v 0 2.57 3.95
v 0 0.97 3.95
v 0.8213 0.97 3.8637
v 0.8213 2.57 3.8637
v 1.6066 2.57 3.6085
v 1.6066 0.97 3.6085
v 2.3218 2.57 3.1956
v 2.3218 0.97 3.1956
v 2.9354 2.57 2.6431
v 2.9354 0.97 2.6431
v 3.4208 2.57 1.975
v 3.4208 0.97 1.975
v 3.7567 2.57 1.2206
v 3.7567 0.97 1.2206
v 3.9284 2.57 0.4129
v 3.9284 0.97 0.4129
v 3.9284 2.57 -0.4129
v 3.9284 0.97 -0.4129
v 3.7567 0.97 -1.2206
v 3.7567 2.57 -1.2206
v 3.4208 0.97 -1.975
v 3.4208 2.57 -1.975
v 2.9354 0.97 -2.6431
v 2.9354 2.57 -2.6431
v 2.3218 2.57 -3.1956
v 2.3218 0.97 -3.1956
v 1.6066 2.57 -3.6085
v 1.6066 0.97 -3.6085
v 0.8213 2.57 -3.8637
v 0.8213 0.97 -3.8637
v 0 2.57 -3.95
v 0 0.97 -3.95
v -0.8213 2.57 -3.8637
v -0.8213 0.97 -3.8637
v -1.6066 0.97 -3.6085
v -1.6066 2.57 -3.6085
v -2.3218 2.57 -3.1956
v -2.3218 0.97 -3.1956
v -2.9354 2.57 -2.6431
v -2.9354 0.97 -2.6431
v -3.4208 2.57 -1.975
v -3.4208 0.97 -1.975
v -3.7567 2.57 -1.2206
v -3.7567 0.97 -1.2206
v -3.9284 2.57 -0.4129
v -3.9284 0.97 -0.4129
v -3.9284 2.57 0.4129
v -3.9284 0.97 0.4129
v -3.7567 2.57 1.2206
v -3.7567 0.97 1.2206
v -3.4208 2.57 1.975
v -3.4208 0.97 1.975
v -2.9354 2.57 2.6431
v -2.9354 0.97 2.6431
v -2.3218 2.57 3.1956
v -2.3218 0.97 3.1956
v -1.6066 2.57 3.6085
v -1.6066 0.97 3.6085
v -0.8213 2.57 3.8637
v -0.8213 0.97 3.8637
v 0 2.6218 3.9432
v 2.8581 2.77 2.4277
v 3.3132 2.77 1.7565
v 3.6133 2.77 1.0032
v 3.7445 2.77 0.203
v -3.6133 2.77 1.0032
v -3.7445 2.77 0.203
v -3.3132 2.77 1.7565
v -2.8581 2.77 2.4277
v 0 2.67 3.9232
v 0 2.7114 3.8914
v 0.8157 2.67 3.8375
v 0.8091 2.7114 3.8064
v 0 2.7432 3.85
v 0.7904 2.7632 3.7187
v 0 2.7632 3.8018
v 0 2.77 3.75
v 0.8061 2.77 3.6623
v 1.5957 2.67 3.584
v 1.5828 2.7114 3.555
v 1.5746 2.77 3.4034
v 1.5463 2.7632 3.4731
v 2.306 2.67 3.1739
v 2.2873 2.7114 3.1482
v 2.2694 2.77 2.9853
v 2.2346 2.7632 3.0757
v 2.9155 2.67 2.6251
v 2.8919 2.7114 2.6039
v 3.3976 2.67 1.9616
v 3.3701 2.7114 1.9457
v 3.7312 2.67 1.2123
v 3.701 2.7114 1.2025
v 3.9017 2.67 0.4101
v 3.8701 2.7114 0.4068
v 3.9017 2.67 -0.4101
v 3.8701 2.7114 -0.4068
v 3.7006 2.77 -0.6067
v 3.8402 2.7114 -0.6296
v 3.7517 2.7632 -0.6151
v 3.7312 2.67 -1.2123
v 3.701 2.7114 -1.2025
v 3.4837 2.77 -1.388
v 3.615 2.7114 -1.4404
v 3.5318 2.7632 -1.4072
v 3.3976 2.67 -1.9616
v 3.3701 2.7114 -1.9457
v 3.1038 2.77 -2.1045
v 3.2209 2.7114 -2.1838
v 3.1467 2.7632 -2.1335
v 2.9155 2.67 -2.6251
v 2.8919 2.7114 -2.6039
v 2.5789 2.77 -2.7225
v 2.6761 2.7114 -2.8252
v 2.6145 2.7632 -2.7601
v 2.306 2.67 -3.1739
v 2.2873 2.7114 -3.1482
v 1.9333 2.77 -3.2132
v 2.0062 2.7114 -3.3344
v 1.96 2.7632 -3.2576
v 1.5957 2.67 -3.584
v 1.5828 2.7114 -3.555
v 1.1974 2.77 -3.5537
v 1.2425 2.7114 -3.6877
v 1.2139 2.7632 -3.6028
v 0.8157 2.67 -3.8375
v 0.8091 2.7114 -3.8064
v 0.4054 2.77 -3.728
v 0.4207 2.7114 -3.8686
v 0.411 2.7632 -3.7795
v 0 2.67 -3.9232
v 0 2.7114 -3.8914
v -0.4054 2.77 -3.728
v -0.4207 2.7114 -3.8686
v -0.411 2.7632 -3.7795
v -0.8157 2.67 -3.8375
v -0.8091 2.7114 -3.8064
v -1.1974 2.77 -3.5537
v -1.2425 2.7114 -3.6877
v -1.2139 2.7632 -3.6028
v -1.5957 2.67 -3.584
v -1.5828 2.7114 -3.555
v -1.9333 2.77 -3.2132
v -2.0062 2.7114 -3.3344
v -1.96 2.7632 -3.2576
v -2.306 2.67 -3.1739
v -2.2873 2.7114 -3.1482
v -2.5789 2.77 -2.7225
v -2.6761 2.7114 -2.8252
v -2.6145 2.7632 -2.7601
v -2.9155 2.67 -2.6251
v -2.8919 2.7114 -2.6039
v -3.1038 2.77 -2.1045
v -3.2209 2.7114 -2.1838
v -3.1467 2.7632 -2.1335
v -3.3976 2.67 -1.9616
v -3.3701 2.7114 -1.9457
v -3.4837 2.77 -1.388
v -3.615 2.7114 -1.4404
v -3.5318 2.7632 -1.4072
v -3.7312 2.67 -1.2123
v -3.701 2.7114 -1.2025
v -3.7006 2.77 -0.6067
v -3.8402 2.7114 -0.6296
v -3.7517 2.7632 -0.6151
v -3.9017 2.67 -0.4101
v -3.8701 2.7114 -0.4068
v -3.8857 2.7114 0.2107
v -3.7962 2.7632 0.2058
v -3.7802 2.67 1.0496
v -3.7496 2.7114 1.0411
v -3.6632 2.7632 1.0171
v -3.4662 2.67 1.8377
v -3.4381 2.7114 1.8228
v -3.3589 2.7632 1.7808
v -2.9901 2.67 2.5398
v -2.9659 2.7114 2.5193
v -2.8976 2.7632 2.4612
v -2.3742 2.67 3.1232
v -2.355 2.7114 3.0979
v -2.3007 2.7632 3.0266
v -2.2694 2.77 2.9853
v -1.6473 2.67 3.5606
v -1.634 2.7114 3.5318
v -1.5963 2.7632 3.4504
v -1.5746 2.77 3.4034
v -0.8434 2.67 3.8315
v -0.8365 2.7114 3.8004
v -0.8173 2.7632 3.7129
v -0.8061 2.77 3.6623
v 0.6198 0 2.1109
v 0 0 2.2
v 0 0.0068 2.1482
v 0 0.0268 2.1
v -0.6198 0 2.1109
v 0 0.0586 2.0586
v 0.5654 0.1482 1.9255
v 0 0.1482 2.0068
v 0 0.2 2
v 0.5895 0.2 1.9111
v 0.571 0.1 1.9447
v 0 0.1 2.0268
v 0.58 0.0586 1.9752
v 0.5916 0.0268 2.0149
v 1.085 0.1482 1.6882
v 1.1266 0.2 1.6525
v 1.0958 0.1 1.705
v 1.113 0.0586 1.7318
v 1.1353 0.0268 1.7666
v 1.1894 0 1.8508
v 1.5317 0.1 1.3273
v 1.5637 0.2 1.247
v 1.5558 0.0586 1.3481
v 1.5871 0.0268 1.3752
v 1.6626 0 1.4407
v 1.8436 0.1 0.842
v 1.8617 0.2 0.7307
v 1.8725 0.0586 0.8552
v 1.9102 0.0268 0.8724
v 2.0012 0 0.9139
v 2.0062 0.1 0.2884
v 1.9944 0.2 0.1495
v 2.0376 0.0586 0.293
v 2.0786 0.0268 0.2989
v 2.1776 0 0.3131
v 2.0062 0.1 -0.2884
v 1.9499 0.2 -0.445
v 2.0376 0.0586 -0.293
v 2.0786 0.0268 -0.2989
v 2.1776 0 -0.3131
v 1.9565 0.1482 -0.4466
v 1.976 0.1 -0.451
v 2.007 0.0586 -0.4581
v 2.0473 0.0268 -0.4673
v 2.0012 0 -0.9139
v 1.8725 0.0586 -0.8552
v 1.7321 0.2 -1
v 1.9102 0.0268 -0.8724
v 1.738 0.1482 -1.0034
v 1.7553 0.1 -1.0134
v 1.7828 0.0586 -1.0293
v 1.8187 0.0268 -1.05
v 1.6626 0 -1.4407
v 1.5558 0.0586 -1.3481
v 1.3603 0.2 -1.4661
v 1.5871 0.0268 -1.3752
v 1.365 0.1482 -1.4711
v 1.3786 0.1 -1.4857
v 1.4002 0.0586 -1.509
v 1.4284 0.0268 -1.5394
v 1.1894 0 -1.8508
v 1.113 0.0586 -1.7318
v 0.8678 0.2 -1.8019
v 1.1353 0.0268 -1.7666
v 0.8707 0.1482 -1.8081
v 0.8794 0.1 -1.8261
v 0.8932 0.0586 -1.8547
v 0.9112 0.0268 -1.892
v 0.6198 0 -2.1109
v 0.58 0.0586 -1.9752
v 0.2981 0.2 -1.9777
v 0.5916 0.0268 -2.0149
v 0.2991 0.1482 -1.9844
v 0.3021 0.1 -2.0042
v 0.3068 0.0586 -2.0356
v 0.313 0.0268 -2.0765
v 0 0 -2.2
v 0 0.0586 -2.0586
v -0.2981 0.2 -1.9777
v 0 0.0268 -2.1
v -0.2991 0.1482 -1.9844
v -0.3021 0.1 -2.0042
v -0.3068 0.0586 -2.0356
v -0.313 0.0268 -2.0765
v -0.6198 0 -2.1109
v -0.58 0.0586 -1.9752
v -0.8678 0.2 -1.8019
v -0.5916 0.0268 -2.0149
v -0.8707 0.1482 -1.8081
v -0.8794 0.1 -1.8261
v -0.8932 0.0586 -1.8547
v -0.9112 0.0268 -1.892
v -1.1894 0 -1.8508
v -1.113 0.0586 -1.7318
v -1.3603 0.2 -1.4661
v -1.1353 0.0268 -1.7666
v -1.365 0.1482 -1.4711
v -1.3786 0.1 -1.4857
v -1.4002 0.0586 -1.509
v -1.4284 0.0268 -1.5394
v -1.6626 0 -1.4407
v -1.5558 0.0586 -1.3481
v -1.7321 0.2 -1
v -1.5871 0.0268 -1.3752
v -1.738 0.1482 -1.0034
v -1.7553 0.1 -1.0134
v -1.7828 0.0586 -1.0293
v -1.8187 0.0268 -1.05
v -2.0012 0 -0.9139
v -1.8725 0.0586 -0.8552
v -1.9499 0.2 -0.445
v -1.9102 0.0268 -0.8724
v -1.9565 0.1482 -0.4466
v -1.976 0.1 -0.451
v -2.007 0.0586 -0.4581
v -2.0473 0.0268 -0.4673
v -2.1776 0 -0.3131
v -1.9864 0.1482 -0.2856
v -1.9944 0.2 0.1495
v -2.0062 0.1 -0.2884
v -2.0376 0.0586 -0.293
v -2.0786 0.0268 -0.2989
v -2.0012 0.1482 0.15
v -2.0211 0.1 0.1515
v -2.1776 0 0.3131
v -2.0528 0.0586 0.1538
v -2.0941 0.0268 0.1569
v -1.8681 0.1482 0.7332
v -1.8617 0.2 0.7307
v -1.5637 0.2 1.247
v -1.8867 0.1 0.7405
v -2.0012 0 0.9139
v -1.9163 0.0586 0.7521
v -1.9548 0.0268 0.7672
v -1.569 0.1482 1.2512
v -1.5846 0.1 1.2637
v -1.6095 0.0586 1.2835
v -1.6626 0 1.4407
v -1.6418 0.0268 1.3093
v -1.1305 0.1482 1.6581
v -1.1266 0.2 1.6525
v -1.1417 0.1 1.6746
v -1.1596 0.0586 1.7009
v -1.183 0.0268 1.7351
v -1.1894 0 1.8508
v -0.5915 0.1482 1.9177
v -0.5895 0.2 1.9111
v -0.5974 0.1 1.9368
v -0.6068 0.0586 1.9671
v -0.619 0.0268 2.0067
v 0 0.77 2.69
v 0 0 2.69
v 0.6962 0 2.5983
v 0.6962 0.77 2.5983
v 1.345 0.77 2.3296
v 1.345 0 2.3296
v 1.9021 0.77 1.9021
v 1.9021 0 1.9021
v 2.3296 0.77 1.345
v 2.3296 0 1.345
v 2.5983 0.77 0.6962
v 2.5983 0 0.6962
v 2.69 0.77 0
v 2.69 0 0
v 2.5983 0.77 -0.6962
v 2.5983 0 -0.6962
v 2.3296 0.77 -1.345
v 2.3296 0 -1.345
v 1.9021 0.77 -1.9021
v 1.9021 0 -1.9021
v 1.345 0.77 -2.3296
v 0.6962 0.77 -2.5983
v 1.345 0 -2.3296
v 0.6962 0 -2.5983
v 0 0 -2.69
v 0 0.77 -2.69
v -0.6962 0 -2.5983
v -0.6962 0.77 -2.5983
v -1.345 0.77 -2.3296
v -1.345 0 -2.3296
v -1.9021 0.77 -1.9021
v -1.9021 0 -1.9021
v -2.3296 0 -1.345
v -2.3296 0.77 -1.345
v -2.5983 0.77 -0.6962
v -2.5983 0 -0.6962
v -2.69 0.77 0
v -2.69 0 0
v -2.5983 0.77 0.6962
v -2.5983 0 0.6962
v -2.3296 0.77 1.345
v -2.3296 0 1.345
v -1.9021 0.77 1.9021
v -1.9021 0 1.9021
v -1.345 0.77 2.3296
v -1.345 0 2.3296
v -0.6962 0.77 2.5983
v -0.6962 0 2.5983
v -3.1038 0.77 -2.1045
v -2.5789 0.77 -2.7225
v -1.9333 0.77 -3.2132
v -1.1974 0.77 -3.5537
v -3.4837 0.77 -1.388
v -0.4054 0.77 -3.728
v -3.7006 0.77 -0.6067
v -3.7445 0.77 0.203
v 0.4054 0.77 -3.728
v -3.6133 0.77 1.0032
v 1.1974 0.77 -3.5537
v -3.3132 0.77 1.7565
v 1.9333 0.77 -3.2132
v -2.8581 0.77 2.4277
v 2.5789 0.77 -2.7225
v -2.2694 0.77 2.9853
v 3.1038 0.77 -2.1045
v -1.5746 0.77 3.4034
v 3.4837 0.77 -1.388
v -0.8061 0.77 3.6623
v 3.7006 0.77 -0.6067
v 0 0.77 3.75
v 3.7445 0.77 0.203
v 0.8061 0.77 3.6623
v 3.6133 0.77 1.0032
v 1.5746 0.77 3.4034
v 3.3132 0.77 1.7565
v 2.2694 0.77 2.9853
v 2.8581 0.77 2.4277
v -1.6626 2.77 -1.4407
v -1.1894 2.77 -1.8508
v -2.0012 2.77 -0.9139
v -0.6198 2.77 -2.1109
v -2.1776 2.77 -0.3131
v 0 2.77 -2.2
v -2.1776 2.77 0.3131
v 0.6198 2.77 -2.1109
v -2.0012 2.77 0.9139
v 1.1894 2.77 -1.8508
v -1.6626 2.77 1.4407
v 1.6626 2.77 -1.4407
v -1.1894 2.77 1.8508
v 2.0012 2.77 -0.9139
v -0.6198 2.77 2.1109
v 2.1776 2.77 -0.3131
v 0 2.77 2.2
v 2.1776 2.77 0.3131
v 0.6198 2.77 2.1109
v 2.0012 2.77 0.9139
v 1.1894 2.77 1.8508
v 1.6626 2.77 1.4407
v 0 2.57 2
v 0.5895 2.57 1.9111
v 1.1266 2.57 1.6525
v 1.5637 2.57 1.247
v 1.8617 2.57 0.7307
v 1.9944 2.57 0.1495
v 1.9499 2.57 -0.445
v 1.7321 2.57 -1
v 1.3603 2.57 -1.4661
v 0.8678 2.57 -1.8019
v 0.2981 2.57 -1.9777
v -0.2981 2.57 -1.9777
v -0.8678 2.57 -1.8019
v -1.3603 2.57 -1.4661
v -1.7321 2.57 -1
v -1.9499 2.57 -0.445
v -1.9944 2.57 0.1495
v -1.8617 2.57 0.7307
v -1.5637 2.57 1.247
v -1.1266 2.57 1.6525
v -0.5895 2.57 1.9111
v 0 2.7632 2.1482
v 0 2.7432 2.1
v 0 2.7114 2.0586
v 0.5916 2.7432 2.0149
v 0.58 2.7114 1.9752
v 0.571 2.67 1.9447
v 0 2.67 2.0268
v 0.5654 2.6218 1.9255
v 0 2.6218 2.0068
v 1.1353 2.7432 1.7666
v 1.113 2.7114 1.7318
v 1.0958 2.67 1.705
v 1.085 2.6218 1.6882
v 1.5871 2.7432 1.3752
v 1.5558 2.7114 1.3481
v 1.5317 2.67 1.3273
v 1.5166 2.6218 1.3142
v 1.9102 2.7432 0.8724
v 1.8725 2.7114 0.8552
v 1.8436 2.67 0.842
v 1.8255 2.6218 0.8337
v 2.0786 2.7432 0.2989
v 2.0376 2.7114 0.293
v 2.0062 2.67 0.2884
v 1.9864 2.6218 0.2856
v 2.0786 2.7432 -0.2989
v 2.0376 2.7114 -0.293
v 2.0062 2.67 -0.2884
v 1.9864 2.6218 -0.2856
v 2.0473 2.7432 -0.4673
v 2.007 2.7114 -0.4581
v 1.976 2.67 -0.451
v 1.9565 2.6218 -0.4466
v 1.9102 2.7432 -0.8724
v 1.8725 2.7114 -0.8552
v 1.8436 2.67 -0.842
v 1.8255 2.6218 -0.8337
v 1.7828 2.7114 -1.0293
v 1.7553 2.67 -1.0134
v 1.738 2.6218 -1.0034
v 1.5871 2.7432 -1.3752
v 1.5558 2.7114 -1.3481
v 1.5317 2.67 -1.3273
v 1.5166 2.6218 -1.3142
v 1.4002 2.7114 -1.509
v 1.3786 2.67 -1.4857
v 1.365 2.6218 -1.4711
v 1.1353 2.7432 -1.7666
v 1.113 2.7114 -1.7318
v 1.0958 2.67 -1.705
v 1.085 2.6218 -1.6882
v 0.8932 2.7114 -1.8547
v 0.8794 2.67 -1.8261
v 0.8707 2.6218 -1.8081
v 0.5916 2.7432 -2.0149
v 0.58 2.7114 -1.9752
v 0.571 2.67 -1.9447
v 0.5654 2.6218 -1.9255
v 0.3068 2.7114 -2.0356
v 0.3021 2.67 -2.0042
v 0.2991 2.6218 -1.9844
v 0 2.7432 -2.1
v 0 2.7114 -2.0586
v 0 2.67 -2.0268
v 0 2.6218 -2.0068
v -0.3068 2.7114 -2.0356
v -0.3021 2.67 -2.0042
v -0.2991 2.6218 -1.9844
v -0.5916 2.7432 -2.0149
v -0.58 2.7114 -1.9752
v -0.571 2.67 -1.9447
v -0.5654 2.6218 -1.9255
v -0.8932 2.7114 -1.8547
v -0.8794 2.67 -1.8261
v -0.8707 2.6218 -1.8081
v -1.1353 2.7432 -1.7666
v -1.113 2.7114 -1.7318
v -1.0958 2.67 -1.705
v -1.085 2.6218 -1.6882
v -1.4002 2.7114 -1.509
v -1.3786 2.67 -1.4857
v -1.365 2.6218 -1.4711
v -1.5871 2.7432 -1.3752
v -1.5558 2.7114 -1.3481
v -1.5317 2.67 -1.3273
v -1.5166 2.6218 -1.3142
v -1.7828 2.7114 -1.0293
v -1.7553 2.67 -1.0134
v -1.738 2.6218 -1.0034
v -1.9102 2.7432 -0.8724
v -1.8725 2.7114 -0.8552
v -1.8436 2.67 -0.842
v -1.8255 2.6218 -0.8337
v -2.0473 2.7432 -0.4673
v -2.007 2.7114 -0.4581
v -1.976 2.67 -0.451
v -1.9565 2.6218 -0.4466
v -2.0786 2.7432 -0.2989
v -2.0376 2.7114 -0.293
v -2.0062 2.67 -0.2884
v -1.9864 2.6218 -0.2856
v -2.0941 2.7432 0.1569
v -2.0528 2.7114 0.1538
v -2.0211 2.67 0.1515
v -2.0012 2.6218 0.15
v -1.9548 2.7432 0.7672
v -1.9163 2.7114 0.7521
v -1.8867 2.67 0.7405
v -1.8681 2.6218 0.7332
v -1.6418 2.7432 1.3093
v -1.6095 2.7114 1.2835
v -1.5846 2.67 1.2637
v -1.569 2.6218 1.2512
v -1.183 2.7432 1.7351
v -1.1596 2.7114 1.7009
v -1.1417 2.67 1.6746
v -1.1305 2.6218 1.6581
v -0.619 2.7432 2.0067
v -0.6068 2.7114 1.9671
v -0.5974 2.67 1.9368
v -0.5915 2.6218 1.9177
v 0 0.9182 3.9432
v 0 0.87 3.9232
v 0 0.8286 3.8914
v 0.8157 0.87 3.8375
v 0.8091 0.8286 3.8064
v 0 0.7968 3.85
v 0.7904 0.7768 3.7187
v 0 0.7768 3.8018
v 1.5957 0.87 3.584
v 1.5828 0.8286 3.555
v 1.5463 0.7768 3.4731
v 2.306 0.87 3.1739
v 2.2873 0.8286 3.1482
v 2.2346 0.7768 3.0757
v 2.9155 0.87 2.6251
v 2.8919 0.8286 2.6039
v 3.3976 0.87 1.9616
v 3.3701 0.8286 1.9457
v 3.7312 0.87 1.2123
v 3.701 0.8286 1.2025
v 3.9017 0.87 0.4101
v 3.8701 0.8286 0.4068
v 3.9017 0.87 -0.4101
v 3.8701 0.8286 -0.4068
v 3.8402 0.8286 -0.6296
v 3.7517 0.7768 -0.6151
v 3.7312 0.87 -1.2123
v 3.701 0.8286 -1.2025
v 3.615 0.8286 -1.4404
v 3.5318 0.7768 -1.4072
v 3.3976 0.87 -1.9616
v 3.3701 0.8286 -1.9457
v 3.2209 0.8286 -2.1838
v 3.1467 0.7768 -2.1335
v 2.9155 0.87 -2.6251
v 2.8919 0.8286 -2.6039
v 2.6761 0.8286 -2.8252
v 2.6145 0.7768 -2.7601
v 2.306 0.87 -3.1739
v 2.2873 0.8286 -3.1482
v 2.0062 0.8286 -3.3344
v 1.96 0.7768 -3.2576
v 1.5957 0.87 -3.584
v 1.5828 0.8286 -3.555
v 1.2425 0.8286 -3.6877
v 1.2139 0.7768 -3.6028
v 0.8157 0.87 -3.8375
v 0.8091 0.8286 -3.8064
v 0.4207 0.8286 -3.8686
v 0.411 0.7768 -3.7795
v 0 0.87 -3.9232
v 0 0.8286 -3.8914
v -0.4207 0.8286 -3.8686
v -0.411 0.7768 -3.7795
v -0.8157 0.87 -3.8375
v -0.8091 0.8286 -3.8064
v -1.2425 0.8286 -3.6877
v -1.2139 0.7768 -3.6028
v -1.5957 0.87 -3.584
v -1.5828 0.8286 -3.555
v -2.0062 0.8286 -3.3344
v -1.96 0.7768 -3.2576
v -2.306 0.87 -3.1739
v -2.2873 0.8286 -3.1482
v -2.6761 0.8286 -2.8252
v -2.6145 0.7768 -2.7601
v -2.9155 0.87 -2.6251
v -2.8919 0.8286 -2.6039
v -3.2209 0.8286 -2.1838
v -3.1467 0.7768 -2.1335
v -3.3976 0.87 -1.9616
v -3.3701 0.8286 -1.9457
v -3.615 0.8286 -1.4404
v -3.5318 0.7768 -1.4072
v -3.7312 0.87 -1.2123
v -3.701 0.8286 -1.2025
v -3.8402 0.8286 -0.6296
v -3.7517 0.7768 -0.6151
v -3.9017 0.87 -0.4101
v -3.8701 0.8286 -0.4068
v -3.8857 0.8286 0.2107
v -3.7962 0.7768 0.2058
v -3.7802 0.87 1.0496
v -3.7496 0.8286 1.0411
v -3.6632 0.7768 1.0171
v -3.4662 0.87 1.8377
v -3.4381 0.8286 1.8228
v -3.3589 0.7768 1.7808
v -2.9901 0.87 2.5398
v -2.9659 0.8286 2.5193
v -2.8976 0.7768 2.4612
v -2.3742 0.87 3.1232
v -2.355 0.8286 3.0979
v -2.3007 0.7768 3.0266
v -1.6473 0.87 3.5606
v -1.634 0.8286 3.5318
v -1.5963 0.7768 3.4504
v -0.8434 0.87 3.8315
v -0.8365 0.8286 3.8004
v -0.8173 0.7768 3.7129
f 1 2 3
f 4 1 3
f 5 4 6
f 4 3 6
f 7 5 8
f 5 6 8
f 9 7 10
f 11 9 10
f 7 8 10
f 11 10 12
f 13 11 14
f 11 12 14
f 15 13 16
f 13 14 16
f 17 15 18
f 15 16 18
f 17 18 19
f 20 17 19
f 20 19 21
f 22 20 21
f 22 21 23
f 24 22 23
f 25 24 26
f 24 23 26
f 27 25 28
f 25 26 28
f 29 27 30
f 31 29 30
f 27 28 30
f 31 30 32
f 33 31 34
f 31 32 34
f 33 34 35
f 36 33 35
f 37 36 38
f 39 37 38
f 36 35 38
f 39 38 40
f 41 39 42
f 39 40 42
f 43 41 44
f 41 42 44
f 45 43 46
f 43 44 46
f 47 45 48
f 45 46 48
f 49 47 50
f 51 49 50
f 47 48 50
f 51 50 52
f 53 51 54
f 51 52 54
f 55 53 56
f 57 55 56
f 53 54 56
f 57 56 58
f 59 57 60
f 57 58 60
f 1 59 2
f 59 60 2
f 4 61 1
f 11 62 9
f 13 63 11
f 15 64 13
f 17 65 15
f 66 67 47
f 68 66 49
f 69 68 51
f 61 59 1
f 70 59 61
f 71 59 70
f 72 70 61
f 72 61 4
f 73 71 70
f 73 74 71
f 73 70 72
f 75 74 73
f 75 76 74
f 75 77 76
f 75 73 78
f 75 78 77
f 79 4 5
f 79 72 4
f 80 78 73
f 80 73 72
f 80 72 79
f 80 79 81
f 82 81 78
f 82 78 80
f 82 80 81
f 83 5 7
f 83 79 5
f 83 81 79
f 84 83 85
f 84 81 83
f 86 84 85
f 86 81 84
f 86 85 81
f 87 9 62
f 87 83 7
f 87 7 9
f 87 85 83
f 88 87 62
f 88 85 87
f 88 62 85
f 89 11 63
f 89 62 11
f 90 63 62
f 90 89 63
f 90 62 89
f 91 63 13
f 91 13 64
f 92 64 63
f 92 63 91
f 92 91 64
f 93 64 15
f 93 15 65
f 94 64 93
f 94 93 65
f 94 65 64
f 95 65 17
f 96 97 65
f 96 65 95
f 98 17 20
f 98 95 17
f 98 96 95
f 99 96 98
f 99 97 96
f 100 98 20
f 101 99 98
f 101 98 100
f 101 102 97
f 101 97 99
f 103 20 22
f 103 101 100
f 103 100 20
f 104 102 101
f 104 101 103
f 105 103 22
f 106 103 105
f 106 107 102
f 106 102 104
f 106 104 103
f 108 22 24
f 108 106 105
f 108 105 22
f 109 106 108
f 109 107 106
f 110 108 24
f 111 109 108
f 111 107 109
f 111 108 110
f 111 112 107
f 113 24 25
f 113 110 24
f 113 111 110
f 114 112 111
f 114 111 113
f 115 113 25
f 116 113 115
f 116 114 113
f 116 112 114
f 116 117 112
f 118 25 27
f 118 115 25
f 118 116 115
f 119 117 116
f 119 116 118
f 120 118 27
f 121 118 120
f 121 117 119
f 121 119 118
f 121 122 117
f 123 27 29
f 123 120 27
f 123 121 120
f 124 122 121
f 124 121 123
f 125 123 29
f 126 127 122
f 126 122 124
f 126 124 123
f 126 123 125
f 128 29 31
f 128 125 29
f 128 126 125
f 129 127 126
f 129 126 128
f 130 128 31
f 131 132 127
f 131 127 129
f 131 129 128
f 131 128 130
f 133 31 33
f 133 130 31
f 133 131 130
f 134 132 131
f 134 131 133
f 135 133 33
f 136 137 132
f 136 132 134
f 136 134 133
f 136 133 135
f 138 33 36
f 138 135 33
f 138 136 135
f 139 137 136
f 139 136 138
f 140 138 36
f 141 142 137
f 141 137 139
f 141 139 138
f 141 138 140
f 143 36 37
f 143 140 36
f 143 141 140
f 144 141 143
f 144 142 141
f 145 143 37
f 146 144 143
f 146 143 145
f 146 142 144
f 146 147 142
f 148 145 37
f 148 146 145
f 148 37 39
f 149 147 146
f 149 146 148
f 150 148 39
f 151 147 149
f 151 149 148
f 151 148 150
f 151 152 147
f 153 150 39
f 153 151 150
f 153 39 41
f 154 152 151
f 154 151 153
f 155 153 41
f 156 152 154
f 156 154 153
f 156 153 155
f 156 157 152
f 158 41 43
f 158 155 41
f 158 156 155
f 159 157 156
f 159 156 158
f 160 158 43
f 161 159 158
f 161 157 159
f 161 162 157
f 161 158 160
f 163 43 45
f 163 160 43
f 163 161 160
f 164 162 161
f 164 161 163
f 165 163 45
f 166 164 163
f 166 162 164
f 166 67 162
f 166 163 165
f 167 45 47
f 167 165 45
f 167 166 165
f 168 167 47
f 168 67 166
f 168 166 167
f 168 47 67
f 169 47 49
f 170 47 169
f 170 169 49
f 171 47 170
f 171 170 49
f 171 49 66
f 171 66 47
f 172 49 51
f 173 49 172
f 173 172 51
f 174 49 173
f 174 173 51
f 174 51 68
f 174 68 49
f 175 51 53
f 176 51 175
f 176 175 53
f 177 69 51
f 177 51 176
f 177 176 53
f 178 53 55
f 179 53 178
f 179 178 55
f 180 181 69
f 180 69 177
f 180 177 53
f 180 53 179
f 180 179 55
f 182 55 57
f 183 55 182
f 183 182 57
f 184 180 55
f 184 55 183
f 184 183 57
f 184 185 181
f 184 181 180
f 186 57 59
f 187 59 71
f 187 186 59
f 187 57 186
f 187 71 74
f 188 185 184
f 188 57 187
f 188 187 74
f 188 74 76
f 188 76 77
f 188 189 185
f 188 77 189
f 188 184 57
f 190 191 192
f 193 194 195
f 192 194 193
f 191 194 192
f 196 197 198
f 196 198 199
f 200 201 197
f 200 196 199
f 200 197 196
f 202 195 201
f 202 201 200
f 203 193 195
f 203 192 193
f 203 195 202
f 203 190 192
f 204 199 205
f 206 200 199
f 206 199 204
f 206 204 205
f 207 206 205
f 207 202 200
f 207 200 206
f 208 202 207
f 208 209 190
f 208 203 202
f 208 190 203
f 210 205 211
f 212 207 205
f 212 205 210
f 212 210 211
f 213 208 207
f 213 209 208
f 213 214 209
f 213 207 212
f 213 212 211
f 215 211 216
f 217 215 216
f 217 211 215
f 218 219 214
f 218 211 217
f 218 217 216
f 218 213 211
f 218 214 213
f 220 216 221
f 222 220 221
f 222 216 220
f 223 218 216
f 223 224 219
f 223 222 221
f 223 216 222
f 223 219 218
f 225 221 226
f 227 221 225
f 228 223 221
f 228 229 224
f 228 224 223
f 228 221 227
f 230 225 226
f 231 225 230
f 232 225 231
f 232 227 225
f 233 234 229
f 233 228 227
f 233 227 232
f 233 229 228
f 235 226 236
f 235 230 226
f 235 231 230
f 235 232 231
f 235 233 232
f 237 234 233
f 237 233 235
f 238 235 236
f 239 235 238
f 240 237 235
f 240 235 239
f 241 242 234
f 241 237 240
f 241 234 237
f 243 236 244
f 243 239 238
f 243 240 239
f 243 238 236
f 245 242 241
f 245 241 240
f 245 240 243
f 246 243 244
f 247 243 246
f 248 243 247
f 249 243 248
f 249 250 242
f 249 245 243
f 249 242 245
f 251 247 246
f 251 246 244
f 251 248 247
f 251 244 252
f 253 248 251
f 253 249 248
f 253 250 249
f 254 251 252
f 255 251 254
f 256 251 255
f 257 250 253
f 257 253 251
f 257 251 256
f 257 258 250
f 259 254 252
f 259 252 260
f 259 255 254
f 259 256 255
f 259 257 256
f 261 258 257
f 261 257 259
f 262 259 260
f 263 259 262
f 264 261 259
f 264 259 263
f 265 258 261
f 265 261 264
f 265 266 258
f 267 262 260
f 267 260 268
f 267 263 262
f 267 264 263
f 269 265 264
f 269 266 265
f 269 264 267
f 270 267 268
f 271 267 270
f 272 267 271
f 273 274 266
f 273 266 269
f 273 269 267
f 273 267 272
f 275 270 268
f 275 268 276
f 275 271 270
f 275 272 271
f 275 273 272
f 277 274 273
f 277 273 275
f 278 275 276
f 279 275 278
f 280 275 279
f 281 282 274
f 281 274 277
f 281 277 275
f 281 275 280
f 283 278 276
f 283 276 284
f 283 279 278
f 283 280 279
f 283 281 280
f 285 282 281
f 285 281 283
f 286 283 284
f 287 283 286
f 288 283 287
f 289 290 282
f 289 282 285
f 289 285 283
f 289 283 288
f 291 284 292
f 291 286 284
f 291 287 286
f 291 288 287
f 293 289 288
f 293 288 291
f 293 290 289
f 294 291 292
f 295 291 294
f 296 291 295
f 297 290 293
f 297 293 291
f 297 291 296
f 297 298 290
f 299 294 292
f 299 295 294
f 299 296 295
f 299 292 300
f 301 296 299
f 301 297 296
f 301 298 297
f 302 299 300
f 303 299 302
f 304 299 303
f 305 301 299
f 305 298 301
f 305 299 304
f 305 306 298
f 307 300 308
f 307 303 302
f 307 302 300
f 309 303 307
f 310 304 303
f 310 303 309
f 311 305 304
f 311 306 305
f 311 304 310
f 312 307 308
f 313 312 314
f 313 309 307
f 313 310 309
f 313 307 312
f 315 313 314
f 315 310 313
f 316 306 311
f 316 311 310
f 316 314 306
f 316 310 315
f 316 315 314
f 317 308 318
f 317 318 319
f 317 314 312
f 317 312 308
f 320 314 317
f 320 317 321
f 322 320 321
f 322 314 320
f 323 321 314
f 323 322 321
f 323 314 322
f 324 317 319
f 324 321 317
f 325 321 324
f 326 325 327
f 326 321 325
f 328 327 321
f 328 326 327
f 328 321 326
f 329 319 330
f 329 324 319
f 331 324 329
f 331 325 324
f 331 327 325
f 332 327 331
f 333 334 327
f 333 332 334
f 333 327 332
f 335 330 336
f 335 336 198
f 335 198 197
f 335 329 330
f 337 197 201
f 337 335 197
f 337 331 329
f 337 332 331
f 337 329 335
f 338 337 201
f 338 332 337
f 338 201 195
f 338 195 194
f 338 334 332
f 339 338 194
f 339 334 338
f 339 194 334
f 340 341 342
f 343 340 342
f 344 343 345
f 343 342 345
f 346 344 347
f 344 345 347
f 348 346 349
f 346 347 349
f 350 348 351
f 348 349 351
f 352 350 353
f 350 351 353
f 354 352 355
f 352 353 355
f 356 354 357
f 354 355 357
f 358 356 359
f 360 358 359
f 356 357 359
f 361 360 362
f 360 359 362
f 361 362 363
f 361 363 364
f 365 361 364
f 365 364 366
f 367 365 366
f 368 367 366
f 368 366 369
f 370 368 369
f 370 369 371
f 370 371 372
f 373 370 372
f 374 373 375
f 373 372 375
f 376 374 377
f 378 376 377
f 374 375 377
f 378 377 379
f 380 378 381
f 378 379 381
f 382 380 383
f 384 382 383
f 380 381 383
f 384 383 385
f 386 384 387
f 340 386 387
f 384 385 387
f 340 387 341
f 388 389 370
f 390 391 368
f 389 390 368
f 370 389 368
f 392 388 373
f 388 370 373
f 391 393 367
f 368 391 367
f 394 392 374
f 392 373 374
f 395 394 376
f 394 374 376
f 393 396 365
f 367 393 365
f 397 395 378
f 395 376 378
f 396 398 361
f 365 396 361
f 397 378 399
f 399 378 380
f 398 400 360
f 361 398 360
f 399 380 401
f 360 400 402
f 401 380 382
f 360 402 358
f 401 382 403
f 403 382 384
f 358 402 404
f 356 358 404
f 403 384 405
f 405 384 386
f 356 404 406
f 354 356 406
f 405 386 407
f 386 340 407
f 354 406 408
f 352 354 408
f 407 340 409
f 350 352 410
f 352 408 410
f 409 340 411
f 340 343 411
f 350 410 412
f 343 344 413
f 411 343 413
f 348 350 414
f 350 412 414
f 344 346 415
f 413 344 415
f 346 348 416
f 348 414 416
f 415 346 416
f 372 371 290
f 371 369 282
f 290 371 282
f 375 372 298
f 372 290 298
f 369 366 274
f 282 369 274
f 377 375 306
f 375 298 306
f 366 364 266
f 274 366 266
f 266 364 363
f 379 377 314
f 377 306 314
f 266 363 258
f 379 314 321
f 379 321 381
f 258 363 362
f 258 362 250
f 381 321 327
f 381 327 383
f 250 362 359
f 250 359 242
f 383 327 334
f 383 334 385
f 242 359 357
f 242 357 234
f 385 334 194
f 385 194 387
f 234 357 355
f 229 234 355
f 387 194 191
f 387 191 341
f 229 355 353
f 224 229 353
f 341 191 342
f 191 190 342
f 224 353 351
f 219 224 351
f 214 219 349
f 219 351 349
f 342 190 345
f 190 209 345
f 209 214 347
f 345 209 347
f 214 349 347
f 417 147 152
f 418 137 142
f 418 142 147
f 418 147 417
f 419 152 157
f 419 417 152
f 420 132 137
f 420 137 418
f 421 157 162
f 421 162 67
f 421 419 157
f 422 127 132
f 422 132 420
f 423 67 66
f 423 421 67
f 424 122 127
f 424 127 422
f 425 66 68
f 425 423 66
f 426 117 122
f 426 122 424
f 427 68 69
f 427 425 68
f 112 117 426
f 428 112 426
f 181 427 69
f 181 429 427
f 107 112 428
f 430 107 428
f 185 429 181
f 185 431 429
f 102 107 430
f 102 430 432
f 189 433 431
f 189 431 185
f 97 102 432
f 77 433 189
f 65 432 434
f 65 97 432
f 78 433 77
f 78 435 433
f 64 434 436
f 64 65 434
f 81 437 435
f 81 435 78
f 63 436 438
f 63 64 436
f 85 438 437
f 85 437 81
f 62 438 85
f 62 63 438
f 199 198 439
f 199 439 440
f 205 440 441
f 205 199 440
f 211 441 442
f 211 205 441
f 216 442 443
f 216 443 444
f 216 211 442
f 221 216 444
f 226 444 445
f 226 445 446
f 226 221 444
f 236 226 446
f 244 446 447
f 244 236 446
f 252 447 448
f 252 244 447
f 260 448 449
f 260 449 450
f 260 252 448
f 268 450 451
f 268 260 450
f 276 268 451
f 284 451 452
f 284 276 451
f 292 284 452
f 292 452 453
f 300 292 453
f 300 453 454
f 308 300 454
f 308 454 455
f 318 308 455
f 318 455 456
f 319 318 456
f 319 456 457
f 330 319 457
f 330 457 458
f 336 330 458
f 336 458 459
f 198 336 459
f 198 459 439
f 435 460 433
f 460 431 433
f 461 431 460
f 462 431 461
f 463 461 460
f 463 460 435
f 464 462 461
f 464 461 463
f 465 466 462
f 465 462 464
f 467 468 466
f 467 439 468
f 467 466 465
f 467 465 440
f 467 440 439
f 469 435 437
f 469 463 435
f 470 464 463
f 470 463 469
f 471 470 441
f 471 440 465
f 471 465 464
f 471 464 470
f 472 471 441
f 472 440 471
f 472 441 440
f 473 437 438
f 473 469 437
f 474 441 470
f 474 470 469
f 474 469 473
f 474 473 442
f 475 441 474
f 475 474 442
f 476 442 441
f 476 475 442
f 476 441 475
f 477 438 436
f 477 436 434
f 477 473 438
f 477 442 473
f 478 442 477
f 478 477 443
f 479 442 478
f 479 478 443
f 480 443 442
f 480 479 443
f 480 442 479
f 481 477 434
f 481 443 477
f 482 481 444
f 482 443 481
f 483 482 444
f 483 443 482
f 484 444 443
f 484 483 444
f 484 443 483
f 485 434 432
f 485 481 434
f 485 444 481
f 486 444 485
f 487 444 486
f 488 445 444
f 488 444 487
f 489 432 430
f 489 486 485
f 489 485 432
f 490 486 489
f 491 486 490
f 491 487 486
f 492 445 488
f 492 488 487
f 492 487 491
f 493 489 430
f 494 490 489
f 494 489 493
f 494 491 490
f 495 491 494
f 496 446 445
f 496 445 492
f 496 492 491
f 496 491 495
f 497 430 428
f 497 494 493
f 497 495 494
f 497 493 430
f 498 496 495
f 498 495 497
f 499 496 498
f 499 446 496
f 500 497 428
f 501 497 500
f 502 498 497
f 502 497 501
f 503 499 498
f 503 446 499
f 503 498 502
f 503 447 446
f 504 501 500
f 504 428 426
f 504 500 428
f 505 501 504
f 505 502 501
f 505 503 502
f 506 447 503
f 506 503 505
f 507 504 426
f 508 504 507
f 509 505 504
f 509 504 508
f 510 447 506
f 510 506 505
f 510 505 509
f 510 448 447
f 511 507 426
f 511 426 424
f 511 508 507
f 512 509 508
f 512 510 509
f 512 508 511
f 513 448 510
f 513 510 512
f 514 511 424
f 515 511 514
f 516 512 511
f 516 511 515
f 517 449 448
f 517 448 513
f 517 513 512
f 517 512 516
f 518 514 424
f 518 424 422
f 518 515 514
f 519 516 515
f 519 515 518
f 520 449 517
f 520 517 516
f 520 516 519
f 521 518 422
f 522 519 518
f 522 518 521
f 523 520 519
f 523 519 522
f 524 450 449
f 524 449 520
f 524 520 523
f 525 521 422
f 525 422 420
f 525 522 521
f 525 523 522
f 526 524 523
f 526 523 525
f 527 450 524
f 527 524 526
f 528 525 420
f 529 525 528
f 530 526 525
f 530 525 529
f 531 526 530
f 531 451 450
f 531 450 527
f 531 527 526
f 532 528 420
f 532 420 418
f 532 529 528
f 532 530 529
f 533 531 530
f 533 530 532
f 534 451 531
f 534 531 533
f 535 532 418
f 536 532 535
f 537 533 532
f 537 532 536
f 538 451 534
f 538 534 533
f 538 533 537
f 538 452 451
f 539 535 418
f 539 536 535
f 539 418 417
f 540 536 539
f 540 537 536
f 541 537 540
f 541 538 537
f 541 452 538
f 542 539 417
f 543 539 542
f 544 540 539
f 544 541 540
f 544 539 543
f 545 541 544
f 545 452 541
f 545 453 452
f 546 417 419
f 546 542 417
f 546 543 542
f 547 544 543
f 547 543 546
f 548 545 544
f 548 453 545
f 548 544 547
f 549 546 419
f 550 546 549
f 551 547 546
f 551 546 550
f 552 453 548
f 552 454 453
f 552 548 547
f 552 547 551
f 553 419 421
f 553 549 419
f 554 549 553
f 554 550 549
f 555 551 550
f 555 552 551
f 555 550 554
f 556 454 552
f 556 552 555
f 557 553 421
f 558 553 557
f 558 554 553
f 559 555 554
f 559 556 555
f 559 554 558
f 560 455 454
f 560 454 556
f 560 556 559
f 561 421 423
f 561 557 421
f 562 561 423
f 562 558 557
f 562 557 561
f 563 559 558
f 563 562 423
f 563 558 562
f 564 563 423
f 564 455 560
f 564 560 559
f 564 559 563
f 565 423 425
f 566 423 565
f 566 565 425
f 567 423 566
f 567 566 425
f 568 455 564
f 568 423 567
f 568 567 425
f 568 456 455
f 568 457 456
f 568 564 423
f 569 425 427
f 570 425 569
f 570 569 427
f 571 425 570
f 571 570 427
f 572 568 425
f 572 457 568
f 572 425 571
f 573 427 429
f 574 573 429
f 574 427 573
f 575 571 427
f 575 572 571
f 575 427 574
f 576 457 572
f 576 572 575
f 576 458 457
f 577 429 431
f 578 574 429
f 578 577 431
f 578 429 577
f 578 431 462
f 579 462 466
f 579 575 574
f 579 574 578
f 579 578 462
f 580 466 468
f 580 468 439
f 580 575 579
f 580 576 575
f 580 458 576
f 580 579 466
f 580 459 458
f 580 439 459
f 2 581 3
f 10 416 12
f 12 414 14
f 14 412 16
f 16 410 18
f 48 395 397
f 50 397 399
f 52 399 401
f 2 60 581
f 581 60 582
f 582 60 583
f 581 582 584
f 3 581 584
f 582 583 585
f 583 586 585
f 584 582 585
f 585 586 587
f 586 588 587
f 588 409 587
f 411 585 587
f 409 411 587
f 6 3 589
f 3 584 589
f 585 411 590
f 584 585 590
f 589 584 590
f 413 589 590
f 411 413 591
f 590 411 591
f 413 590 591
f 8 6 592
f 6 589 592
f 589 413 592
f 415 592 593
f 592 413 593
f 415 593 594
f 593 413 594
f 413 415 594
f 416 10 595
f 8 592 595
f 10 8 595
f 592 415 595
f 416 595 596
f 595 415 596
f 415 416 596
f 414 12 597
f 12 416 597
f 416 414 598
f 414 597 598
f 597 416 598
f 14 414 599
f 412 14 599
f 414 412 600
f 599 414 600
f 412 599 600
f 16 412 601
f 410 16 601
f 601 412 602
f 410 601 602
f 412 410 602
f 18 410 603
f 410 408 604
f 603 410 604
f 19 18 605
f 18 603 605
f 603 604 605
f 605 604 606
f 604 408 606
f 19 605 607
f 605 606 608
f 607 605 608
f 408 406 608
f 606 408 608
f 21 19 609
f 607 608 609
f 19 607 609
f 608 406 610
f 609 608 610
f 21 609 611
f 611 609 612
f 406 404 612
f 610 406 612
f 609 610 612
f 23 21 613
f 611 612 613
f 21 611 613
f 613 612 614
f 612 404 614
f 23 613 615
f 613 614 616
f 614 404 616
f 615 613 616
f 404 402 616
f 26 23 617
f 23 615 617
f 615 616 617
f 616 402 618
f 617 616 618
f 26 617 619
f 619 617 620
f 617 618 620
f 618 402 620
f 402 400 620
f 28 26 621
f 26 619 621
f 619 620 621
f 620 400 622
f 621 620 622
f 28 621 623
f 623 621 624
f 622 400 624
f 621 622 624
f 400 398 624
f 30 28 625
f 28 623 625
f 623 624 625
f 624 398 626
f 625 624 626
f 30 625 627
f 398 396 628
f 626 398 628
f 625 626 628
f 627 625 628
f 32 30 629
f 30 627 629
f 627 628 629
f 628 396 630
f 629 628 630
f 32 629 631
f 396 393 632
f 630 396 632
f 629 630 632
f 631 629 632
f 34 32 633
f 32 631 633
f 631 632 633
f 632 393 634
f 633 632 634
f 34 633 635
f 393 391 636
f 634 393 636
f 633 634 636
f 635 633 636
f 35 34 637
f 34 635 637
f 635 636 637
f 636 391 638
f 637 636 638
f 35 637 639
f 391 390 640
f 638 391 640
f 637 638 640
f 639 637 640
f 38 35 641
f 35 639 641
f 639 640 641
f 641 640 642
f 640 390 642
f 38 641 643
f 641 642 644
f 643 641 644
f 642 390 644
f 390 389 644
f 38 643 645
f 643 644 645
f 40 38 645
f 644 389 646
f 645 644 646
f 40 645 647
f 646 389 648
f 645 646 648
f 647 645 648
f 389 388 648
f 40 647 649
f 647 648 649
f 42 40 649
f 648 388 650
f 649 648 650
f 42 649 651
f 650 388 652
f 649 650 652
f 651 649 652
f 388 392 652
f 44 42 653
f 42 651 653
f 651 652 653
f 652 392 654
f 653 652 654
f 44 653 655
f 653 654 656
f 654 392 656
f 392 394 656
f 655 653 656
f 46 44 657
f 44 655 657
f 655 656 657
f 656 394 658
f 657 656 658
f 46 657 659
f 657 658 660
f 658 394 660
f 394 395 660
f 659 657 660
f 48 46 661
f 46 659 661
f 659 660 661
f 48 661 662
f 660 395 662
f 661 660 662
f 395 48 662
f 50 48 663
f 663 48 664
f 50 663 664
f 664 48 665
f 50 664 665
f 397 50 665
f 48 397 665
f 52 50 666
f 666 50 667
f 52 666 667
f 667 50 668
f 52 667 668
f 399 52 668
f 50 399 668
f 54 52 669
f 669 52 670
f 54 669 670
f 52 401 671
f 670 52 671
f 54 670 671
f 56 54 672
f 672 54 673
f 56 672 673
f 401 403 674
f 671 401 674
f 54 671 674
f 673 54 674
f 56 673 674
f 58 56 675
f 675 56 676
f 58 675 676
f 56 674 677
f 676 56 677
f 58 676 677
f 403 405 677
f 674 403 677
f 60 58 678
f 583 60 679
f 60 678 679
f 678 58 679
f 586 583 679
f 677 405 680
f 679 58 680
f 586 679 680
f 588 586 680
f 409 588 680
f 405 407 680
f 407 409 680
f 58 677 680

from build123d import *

# Parameters (mm, degrees)
SKETCH_1_R      = 2.69
SKETCH_1_R_2    = 2
EXTRUDE_1_DEPTH = 0.77
SKETCH_2_R      = 3.95
SKETCH_2_R_2    = 2
EXTRUDE_2_DEPTH = 2
FILLET_1_R      = 0.2


with BuildPart() as part:
    # 草图1 → 凸台-拉伸1 (new body)
    with BuildSketch(Plane(origin=(0, 0, 0), x_dir=(1, 0, 0), z_dir=(0, 1, 0))):
        with Locations(Location((0, 0, 0), (0, 0, 270))):
            Circle(SKETCH_1_R)
        with Locations(Location((0, 0, 0), (0, 0, 270))):
            Circle(SKETCH_1_R_2, mode=Mode.SUBTRACT)
    extrude(amount=EXTRUDE_1_DEPTH)

    # 草图2 → 凸台-拉伸2 (add)
    with BuildSketch(Plane(origin=(0, 0.77, 0), x_dir=(1, 0, 0), z_dir=(0, 1, 0))):
        with Locations(Location((0, 0, 0), (0, 0, 270))):
            Circle(SKETCH_2_R)
        with Locations(Location((0, 0, 0), (0, 0, 270))):
            Circle(SKETCH_2_R_2, mode=Mode.SUBTRACT)
    extrude(amount=EXTRUDE_2_DEPTH)

    # 圆角1
    fillet_1_edges = [part.edges().sort_by_distance(p)[0] for p in [
        (0, 0.77, -3.95),
        (0, 2.77, -2),
        (0, 0, -2),
        (0, 2.77, -3.95),
    ]]
    fillet(fillet_1_edges, radius=FILLET_1_R)


solid = part.part
